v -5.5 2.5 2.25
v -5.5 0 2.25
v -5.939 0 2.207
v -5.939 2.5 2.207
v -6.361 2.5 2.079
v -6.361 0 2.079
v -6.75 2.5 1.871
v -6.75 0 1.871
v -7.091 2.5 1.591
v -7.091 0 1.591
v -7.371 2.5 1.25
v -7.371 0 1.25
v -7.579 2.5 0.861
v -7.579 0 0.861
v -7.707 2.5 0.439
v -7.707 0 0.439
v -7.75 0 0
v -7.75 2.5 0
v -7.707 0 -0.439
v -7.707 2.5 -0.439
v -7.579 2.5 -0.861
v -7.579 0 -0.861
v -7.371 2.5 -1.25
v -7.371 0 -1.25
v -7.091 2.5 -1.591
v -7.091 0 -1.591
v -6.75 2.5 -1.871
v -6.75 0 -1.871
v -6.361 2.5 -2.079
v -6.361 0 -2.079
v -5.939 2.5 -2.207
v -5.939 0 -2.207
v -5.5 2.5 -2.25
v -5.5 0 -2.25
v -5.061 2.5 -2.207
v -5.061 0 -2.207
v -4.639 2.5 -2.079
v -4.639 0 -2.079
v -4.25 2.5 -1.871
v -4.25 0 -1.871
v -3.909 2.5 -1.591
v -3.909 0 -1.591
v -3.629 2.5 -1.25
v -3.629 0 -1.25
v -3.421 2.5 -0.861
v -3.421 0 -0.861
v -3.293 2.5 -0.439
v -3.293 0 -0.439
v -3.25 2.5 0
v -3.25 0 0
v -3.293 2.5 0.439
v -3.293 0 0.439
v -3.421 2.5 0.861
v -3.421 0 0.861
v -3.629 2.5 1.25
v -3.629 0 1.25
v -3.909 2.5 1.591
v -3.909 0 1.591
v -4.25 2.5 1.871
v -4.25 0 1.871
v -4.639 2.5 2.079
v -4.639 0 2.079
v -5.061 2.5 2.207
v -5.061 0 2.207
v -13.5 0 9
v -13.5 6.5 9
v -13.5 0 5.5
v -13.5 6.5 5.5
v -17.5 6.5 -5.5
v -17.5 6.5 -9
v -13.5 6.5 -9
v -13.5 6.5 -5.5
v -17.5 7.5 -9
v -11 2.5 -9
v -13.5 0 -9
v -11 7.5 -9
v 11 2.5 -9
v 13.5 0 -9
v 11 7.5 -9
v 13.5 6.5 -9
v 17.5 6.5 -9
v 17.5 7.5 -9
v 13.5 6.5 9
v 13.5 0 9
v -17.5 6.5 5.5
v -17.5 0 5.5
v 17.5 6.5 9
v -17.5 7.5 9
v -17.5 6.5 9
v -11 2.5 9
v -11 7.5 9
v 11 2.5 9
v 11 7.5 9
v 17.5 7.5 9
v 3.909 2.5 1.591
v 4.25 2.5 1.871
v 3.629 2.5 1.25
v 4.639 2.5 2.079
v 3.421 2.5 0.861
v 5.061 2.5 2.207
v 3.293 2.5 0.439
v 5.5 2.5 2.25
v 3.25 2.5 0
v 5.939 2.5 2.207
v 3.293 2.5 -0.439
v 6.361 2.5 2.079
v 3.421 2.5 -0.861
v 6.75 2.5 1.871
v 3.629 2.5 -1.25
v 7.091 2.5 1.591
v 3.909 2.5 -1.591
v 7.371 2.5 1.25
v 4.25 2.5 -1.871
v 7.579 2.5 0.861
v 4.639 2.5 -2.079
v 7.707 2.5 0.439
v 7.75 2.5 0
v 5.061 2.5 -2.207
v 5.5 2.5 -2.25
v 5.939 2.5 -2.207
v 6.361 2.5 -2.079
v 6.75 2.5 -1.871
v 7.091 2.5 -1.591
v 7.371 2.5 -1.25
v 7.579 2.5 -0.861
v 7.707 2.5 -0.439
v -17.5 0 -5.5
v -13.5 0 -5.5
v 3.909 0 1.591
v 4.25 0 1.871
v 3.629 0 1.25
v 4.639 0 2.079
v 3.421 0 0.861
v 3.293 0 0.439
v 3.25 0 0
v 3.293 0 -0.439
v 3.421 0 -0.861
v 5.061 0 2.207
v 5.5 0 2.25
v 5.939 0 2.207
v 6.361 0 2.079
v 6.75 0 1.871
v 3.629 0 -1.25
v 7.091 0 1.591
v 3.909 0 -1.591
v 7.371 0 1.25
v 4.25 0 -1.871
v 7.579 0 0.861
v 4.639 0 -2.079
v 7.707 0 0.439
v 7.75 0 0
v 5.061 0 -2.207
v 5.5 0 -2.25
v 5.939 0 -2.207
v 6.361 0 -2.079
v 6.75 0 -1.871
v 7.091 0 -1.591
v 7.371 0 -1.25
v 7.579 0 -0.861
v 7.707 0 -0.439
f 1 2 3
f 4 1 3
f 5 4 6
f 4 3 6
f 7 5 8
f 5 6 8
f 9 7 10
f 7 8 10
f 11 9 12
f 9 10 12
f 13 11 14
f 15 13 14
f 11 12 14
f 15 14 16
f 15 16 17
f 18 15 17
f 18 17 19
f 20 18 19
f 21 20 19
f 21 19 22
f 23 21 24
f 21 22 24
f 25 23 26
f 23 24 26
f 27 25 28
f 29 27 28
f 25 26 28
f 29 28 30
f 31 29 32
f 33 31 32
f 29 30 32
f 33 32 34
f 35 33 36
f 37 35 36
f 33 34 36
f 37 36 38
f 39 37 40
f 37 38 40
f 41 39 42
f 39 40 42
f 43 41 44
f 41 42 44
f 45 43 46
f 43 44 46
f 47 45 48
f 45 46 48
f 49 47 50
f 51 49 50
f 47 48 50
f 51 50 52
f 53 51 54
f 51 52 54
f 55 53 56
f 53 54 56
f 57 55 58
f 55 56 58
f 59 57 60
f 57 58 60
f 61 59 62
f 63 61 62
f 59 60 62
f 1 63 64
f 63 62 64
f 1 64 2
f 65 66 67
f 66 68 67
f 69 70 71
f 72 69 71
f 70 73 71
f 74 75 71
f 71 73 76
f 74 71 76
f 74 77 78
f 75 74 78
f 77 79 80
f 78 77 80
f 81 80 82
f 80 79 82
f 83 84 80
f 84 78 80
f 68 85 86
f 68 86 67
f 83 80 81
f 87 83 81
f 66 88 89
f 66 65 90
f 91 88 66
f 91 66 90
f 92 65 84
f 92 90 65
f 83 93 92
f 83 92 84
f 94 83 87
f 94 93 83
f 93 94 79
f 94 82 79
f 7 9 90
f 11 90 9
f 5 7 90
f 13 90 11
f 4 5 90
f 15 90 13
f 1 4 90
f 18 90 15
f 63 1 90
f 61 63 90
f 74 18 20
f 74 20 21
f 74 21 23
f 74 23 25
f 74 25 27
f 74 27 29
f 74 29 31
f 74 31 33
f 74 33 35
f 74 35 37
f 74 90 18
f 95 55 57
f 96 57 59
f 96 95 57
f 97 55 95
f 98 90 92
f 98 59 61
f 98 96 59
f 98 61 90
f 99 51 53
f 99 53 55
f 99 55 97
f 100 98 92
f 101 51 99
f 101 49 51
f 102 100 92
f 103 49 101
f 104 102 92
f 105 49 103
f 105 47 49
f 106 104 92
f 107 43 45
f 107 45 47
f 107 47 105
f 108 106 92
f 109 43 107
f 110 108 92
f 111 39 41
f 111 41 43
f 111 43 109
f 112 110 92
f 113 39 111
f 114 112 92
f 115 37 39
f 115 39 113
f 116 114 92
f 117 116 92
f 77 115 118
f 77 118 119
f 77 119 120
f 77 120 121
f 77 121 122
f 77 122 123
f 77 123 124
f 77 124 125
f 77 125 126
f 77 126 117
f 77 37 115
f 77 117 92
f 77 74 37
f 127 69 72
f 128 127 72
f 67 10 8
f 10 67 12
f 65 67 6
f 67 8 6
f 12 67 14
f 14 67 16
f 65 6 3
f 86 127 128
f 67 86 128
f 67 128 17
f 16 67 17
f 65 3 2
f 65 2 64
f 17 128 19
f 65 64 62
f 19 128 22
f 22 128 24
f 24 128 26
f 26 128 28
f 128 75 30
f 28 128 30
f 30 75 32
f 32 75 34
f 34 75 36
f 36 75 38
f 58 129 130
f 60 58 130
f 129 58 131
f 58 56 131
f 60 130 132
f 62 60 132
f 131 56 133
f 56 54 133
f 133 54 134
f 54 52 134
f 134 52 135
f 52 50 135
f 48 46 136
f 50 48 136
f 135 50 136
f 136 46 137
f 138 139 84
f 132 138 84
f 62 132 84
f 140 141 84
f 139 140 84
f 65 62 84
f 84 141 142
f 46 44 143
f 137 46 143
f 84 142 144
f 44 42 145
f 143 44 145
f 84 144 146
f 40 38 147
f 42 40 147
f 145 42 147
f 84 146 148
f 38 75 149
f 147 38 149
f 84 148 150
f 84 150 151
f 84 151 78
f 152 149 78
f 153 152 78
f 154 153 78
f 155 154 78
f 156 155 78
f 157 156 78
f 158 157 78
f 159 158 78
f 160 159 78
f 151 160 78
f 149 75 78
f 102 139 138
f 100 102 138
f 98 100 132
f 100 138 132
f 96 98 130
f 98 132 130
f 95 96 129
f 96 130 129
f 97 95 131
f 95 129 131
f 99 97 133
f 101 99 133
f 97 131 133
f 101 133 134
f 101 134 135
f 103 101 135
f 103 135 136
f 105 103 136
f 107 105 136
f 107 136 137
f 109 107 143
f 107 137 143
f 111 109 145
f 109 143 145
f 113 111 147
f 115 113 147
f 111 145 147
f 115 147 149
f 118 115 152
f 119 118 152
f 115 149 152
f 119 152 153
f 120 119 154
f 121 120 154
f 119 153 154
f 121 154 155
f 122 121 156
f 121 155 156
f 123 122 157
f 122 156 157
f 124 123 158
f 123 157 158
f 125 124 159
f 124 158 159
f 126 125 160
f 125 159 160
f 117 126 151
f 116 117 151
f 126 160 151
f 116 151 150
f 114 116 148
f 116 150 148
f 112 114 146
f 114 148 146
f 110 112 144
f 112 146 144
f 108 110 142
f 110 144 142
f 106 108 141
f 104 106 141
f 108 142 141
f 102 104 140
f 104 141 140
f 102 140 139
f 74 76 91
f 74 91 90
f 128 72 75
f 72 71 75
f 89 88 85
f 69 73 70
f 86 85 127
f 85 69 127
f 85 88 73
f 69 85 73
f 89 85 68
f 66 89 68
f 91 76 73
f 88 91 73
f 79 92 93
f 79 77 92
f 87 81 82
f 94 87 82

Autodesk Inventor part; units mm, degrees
ref_plane "YZ Plane" through (0, 0, 0) normal (1, 0, 0) x (0, 1, 0)
ref_plane "XZ Plane" through (0, 0, 0) normal (0, 1, 0) x (-1, 0, 0)
ref_plane "XY Plane" through (0, 0, 0) normal (0, 0, 1) x (1, 0, 0)
sketch "Skizze1" plane through (0, 0, 0) normal (0, 0, 1) x (1, 0, 0)
  line L0 (-17.5, 7.5) -> (-17.5, 6.5)
  line L1 (-17.5, 6.5) -> (-13.5, 6.5)
  line L2 (-13.5, 6.5) -> (-13.5, 0)
  line L3 (-13.5, 0) -> (13.5, 0)
  line L4 (13.5, 0) -> (13.5, 6.5)
  line L5 (13.5, 6.5) -> (17.5, 6.5)
  line L6 (17.5, 6.5) -> (17.5, 7.5)
  line L7 (17.5, 7.5) -> (11, 7.5)
  line L8 (-11, 7.5) -> (-17.5, 7.5)
  line L9 (0, -1.5) -> (0, 9) construction
  line L10 (-11, 2.5) -> (11, 2.5)
  line L11 (-11, 7.5) -> (-11, 2.5)
  line L12 (11, 2.5) -> (11, 7.5)
  line L13 (-13.5, 0) -> (-17.5, 0)
  line L14 (-17.5, 0) -> (-17.5, 6.5)
  line L15 (-17.5, 6.5) -> (-13.5, 6.5)
  line L16 (-13.5, 6.5) -> (-13.5, 0)
  point P0 (0, 0)
  point P1 (0, 2.5)
  dimension "d0" = 1
  dimension "d1" = 35
  dimension "d2" = 27
  dimension "d3" = 7.5
  dimension "d6" = 4
  dimension "d7" = 2.5
  dimension "d8" = 2.5
extrude "Extrusion1" add sketch "Skizze1" along normal mid plane 18 contours L8 L11 L10 L12 L7 L6 L5 L4 L3 L2 L1 L0
extrude "Extrusion2" add sketch "Skizze1" along normal mid plane 11 contours L1 L2 L13 L14
sketch "Skizze2" plane through (-11, 2.5, 9) normal (0, 1, 0) x (1, 0, 0)
  line L0 (0, 18) -> (0, 0) projected
  line L1 (22, 0) -> (0, 0) projected
  line L2 (22, 18) -> (22, 0) projected
  line L3 (0, 18) -> (22, 18) projected
  line L4 (0, 9) -> (22, 9) construction
  line L5 (11, 0) -> (11, 18) construction
  point P0 (11, 9)
  point P1 (5.5, 9)
  point P2 (16.5, 9)
  dimension "d13" = 11
  dimension "d14" = 22
hole "Bohrung1" at (-5.5, 2.5, 0) at (5.5, 2.5, 0) direction (0, -1, 0) diameter 4.5 end through all clearance for "Flachkopfsenkschraube DIN EN ISO 2009" size "M4" standard "DIN"
properties part number "Hutschiene"
